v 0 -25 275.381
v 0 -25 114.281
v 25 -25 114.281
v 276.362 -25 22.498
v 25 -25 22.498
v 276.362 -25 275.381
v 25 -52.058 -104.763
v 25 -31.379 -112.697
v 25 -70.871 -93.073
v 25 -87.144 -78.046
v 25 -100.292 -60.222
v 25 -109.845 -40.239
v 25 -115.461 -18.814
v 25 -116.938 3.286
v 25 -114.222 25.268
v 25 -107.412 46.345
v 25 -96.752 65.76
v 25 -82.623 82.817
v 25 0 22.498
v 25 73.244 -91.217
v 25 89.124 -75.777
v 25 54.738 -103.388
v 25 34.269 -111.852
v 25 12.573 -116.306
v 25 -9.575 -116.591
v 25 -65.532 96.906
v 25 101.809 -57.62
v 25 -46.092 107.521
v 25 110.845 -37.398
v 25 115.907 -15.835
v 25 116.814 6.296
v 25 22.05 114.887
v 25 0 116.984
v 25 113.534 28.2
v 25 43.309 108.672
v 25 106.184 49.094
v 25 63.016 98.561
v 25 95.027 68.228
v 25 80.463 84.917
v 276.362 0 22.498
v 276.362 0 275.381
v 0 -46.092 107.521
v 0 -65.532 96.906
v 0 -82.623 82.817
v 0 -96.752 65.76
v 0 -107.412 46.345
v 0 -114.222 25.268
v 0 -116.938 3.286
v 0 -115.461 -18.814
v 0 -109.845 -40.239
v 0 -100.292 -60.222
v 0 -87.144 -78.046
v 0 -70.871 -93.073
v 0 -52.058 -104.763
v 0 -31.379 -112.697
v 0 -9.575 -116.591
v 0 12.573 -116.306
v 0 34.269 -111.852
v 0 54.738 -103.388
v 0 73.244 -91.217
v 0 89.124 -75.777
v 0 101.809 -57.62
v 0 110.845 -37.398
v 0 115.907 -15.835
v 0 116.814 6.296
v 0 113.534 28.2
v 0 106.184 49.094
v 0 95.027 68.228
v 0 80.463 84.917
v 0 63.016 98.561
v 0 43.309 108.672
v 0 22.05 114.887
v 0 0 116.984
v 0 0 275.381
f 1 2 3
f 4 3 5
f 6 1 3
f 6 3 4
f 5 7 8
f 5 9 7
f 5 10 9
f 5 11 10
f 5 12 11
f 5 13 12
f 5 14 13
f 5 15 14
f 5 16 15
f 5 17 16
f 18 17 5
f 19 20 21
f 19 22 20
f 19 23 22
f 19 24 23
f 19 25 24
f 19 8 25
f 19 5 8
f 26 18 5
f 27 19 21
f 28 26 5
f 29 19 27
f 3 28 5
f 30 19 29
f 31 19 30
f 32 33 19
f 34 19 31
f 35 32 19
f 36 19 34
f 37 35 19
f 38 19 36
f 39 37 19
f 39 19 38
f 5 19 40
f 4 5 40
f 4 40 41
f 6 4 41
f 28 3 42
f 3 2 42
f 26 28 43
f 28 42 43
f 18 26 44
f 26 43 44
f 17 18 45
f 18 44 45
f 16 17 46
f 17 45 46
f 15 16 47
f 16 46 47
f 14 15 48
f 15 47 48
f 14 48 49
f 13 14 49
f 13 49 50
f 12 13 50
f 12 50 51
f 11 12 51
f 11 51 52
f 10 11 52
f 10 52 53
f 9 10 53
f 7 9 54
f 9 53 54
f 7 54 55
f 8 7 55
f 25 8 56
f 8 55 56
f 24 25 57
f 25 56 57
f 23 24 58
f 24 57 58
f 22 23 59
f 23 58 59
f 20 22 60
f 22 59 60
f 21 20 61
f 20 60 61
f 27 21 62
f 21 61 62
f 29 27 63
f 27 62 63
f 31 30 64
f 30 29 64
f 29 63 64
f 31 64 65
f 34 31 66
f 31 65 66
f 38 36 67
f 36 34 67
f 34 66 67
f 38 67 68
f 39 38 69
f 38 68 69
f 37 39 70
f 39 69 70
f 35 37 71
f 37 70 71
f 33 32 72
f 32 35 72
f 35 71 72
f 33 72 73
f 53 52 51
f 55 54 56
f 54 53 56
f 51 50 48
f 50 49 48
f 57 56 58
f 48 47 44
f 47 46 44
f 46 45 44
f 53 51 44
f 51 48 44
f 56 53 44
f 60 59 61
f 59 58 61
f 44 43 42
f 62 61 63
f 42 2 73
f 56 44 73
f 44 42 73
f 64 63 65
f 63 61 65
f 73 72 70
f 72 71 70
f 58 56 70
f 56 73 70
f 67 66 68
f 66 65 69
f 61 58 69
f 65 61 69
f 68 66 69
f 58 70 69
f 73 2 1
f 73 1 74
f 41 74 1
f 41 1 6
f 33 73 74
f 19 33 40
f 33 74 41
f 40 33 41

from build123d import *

# Parameters (mm, degrees)
F2_R     = 116.9838211005
F3_DEPTH = 25
F4_W     = 276.3622701168
F4_H     = 252.8828978539
F5_DEPTH = 25


# Not quite as in the source:
# - the program builds the solid bodies; features that only make, move or delete a surface that nothing else refers to are left out


with BuildPart() as f3:
    # F2 (on Right) → F3 (new body)
    with BuildSketch(Plane.YZ):
        Circle(F2_R)
    extrude(amount=F3_DEPTH)

    # F4 (on Front) → F5 (join)
    with BuildSketch(Plane.XZ):
        with Locations((138.1811350584, 148.9392518997)):
            Rectangle(F4_W, F4_H)
    extrude(amount=F5_DEPTH)


solid = f3.part
